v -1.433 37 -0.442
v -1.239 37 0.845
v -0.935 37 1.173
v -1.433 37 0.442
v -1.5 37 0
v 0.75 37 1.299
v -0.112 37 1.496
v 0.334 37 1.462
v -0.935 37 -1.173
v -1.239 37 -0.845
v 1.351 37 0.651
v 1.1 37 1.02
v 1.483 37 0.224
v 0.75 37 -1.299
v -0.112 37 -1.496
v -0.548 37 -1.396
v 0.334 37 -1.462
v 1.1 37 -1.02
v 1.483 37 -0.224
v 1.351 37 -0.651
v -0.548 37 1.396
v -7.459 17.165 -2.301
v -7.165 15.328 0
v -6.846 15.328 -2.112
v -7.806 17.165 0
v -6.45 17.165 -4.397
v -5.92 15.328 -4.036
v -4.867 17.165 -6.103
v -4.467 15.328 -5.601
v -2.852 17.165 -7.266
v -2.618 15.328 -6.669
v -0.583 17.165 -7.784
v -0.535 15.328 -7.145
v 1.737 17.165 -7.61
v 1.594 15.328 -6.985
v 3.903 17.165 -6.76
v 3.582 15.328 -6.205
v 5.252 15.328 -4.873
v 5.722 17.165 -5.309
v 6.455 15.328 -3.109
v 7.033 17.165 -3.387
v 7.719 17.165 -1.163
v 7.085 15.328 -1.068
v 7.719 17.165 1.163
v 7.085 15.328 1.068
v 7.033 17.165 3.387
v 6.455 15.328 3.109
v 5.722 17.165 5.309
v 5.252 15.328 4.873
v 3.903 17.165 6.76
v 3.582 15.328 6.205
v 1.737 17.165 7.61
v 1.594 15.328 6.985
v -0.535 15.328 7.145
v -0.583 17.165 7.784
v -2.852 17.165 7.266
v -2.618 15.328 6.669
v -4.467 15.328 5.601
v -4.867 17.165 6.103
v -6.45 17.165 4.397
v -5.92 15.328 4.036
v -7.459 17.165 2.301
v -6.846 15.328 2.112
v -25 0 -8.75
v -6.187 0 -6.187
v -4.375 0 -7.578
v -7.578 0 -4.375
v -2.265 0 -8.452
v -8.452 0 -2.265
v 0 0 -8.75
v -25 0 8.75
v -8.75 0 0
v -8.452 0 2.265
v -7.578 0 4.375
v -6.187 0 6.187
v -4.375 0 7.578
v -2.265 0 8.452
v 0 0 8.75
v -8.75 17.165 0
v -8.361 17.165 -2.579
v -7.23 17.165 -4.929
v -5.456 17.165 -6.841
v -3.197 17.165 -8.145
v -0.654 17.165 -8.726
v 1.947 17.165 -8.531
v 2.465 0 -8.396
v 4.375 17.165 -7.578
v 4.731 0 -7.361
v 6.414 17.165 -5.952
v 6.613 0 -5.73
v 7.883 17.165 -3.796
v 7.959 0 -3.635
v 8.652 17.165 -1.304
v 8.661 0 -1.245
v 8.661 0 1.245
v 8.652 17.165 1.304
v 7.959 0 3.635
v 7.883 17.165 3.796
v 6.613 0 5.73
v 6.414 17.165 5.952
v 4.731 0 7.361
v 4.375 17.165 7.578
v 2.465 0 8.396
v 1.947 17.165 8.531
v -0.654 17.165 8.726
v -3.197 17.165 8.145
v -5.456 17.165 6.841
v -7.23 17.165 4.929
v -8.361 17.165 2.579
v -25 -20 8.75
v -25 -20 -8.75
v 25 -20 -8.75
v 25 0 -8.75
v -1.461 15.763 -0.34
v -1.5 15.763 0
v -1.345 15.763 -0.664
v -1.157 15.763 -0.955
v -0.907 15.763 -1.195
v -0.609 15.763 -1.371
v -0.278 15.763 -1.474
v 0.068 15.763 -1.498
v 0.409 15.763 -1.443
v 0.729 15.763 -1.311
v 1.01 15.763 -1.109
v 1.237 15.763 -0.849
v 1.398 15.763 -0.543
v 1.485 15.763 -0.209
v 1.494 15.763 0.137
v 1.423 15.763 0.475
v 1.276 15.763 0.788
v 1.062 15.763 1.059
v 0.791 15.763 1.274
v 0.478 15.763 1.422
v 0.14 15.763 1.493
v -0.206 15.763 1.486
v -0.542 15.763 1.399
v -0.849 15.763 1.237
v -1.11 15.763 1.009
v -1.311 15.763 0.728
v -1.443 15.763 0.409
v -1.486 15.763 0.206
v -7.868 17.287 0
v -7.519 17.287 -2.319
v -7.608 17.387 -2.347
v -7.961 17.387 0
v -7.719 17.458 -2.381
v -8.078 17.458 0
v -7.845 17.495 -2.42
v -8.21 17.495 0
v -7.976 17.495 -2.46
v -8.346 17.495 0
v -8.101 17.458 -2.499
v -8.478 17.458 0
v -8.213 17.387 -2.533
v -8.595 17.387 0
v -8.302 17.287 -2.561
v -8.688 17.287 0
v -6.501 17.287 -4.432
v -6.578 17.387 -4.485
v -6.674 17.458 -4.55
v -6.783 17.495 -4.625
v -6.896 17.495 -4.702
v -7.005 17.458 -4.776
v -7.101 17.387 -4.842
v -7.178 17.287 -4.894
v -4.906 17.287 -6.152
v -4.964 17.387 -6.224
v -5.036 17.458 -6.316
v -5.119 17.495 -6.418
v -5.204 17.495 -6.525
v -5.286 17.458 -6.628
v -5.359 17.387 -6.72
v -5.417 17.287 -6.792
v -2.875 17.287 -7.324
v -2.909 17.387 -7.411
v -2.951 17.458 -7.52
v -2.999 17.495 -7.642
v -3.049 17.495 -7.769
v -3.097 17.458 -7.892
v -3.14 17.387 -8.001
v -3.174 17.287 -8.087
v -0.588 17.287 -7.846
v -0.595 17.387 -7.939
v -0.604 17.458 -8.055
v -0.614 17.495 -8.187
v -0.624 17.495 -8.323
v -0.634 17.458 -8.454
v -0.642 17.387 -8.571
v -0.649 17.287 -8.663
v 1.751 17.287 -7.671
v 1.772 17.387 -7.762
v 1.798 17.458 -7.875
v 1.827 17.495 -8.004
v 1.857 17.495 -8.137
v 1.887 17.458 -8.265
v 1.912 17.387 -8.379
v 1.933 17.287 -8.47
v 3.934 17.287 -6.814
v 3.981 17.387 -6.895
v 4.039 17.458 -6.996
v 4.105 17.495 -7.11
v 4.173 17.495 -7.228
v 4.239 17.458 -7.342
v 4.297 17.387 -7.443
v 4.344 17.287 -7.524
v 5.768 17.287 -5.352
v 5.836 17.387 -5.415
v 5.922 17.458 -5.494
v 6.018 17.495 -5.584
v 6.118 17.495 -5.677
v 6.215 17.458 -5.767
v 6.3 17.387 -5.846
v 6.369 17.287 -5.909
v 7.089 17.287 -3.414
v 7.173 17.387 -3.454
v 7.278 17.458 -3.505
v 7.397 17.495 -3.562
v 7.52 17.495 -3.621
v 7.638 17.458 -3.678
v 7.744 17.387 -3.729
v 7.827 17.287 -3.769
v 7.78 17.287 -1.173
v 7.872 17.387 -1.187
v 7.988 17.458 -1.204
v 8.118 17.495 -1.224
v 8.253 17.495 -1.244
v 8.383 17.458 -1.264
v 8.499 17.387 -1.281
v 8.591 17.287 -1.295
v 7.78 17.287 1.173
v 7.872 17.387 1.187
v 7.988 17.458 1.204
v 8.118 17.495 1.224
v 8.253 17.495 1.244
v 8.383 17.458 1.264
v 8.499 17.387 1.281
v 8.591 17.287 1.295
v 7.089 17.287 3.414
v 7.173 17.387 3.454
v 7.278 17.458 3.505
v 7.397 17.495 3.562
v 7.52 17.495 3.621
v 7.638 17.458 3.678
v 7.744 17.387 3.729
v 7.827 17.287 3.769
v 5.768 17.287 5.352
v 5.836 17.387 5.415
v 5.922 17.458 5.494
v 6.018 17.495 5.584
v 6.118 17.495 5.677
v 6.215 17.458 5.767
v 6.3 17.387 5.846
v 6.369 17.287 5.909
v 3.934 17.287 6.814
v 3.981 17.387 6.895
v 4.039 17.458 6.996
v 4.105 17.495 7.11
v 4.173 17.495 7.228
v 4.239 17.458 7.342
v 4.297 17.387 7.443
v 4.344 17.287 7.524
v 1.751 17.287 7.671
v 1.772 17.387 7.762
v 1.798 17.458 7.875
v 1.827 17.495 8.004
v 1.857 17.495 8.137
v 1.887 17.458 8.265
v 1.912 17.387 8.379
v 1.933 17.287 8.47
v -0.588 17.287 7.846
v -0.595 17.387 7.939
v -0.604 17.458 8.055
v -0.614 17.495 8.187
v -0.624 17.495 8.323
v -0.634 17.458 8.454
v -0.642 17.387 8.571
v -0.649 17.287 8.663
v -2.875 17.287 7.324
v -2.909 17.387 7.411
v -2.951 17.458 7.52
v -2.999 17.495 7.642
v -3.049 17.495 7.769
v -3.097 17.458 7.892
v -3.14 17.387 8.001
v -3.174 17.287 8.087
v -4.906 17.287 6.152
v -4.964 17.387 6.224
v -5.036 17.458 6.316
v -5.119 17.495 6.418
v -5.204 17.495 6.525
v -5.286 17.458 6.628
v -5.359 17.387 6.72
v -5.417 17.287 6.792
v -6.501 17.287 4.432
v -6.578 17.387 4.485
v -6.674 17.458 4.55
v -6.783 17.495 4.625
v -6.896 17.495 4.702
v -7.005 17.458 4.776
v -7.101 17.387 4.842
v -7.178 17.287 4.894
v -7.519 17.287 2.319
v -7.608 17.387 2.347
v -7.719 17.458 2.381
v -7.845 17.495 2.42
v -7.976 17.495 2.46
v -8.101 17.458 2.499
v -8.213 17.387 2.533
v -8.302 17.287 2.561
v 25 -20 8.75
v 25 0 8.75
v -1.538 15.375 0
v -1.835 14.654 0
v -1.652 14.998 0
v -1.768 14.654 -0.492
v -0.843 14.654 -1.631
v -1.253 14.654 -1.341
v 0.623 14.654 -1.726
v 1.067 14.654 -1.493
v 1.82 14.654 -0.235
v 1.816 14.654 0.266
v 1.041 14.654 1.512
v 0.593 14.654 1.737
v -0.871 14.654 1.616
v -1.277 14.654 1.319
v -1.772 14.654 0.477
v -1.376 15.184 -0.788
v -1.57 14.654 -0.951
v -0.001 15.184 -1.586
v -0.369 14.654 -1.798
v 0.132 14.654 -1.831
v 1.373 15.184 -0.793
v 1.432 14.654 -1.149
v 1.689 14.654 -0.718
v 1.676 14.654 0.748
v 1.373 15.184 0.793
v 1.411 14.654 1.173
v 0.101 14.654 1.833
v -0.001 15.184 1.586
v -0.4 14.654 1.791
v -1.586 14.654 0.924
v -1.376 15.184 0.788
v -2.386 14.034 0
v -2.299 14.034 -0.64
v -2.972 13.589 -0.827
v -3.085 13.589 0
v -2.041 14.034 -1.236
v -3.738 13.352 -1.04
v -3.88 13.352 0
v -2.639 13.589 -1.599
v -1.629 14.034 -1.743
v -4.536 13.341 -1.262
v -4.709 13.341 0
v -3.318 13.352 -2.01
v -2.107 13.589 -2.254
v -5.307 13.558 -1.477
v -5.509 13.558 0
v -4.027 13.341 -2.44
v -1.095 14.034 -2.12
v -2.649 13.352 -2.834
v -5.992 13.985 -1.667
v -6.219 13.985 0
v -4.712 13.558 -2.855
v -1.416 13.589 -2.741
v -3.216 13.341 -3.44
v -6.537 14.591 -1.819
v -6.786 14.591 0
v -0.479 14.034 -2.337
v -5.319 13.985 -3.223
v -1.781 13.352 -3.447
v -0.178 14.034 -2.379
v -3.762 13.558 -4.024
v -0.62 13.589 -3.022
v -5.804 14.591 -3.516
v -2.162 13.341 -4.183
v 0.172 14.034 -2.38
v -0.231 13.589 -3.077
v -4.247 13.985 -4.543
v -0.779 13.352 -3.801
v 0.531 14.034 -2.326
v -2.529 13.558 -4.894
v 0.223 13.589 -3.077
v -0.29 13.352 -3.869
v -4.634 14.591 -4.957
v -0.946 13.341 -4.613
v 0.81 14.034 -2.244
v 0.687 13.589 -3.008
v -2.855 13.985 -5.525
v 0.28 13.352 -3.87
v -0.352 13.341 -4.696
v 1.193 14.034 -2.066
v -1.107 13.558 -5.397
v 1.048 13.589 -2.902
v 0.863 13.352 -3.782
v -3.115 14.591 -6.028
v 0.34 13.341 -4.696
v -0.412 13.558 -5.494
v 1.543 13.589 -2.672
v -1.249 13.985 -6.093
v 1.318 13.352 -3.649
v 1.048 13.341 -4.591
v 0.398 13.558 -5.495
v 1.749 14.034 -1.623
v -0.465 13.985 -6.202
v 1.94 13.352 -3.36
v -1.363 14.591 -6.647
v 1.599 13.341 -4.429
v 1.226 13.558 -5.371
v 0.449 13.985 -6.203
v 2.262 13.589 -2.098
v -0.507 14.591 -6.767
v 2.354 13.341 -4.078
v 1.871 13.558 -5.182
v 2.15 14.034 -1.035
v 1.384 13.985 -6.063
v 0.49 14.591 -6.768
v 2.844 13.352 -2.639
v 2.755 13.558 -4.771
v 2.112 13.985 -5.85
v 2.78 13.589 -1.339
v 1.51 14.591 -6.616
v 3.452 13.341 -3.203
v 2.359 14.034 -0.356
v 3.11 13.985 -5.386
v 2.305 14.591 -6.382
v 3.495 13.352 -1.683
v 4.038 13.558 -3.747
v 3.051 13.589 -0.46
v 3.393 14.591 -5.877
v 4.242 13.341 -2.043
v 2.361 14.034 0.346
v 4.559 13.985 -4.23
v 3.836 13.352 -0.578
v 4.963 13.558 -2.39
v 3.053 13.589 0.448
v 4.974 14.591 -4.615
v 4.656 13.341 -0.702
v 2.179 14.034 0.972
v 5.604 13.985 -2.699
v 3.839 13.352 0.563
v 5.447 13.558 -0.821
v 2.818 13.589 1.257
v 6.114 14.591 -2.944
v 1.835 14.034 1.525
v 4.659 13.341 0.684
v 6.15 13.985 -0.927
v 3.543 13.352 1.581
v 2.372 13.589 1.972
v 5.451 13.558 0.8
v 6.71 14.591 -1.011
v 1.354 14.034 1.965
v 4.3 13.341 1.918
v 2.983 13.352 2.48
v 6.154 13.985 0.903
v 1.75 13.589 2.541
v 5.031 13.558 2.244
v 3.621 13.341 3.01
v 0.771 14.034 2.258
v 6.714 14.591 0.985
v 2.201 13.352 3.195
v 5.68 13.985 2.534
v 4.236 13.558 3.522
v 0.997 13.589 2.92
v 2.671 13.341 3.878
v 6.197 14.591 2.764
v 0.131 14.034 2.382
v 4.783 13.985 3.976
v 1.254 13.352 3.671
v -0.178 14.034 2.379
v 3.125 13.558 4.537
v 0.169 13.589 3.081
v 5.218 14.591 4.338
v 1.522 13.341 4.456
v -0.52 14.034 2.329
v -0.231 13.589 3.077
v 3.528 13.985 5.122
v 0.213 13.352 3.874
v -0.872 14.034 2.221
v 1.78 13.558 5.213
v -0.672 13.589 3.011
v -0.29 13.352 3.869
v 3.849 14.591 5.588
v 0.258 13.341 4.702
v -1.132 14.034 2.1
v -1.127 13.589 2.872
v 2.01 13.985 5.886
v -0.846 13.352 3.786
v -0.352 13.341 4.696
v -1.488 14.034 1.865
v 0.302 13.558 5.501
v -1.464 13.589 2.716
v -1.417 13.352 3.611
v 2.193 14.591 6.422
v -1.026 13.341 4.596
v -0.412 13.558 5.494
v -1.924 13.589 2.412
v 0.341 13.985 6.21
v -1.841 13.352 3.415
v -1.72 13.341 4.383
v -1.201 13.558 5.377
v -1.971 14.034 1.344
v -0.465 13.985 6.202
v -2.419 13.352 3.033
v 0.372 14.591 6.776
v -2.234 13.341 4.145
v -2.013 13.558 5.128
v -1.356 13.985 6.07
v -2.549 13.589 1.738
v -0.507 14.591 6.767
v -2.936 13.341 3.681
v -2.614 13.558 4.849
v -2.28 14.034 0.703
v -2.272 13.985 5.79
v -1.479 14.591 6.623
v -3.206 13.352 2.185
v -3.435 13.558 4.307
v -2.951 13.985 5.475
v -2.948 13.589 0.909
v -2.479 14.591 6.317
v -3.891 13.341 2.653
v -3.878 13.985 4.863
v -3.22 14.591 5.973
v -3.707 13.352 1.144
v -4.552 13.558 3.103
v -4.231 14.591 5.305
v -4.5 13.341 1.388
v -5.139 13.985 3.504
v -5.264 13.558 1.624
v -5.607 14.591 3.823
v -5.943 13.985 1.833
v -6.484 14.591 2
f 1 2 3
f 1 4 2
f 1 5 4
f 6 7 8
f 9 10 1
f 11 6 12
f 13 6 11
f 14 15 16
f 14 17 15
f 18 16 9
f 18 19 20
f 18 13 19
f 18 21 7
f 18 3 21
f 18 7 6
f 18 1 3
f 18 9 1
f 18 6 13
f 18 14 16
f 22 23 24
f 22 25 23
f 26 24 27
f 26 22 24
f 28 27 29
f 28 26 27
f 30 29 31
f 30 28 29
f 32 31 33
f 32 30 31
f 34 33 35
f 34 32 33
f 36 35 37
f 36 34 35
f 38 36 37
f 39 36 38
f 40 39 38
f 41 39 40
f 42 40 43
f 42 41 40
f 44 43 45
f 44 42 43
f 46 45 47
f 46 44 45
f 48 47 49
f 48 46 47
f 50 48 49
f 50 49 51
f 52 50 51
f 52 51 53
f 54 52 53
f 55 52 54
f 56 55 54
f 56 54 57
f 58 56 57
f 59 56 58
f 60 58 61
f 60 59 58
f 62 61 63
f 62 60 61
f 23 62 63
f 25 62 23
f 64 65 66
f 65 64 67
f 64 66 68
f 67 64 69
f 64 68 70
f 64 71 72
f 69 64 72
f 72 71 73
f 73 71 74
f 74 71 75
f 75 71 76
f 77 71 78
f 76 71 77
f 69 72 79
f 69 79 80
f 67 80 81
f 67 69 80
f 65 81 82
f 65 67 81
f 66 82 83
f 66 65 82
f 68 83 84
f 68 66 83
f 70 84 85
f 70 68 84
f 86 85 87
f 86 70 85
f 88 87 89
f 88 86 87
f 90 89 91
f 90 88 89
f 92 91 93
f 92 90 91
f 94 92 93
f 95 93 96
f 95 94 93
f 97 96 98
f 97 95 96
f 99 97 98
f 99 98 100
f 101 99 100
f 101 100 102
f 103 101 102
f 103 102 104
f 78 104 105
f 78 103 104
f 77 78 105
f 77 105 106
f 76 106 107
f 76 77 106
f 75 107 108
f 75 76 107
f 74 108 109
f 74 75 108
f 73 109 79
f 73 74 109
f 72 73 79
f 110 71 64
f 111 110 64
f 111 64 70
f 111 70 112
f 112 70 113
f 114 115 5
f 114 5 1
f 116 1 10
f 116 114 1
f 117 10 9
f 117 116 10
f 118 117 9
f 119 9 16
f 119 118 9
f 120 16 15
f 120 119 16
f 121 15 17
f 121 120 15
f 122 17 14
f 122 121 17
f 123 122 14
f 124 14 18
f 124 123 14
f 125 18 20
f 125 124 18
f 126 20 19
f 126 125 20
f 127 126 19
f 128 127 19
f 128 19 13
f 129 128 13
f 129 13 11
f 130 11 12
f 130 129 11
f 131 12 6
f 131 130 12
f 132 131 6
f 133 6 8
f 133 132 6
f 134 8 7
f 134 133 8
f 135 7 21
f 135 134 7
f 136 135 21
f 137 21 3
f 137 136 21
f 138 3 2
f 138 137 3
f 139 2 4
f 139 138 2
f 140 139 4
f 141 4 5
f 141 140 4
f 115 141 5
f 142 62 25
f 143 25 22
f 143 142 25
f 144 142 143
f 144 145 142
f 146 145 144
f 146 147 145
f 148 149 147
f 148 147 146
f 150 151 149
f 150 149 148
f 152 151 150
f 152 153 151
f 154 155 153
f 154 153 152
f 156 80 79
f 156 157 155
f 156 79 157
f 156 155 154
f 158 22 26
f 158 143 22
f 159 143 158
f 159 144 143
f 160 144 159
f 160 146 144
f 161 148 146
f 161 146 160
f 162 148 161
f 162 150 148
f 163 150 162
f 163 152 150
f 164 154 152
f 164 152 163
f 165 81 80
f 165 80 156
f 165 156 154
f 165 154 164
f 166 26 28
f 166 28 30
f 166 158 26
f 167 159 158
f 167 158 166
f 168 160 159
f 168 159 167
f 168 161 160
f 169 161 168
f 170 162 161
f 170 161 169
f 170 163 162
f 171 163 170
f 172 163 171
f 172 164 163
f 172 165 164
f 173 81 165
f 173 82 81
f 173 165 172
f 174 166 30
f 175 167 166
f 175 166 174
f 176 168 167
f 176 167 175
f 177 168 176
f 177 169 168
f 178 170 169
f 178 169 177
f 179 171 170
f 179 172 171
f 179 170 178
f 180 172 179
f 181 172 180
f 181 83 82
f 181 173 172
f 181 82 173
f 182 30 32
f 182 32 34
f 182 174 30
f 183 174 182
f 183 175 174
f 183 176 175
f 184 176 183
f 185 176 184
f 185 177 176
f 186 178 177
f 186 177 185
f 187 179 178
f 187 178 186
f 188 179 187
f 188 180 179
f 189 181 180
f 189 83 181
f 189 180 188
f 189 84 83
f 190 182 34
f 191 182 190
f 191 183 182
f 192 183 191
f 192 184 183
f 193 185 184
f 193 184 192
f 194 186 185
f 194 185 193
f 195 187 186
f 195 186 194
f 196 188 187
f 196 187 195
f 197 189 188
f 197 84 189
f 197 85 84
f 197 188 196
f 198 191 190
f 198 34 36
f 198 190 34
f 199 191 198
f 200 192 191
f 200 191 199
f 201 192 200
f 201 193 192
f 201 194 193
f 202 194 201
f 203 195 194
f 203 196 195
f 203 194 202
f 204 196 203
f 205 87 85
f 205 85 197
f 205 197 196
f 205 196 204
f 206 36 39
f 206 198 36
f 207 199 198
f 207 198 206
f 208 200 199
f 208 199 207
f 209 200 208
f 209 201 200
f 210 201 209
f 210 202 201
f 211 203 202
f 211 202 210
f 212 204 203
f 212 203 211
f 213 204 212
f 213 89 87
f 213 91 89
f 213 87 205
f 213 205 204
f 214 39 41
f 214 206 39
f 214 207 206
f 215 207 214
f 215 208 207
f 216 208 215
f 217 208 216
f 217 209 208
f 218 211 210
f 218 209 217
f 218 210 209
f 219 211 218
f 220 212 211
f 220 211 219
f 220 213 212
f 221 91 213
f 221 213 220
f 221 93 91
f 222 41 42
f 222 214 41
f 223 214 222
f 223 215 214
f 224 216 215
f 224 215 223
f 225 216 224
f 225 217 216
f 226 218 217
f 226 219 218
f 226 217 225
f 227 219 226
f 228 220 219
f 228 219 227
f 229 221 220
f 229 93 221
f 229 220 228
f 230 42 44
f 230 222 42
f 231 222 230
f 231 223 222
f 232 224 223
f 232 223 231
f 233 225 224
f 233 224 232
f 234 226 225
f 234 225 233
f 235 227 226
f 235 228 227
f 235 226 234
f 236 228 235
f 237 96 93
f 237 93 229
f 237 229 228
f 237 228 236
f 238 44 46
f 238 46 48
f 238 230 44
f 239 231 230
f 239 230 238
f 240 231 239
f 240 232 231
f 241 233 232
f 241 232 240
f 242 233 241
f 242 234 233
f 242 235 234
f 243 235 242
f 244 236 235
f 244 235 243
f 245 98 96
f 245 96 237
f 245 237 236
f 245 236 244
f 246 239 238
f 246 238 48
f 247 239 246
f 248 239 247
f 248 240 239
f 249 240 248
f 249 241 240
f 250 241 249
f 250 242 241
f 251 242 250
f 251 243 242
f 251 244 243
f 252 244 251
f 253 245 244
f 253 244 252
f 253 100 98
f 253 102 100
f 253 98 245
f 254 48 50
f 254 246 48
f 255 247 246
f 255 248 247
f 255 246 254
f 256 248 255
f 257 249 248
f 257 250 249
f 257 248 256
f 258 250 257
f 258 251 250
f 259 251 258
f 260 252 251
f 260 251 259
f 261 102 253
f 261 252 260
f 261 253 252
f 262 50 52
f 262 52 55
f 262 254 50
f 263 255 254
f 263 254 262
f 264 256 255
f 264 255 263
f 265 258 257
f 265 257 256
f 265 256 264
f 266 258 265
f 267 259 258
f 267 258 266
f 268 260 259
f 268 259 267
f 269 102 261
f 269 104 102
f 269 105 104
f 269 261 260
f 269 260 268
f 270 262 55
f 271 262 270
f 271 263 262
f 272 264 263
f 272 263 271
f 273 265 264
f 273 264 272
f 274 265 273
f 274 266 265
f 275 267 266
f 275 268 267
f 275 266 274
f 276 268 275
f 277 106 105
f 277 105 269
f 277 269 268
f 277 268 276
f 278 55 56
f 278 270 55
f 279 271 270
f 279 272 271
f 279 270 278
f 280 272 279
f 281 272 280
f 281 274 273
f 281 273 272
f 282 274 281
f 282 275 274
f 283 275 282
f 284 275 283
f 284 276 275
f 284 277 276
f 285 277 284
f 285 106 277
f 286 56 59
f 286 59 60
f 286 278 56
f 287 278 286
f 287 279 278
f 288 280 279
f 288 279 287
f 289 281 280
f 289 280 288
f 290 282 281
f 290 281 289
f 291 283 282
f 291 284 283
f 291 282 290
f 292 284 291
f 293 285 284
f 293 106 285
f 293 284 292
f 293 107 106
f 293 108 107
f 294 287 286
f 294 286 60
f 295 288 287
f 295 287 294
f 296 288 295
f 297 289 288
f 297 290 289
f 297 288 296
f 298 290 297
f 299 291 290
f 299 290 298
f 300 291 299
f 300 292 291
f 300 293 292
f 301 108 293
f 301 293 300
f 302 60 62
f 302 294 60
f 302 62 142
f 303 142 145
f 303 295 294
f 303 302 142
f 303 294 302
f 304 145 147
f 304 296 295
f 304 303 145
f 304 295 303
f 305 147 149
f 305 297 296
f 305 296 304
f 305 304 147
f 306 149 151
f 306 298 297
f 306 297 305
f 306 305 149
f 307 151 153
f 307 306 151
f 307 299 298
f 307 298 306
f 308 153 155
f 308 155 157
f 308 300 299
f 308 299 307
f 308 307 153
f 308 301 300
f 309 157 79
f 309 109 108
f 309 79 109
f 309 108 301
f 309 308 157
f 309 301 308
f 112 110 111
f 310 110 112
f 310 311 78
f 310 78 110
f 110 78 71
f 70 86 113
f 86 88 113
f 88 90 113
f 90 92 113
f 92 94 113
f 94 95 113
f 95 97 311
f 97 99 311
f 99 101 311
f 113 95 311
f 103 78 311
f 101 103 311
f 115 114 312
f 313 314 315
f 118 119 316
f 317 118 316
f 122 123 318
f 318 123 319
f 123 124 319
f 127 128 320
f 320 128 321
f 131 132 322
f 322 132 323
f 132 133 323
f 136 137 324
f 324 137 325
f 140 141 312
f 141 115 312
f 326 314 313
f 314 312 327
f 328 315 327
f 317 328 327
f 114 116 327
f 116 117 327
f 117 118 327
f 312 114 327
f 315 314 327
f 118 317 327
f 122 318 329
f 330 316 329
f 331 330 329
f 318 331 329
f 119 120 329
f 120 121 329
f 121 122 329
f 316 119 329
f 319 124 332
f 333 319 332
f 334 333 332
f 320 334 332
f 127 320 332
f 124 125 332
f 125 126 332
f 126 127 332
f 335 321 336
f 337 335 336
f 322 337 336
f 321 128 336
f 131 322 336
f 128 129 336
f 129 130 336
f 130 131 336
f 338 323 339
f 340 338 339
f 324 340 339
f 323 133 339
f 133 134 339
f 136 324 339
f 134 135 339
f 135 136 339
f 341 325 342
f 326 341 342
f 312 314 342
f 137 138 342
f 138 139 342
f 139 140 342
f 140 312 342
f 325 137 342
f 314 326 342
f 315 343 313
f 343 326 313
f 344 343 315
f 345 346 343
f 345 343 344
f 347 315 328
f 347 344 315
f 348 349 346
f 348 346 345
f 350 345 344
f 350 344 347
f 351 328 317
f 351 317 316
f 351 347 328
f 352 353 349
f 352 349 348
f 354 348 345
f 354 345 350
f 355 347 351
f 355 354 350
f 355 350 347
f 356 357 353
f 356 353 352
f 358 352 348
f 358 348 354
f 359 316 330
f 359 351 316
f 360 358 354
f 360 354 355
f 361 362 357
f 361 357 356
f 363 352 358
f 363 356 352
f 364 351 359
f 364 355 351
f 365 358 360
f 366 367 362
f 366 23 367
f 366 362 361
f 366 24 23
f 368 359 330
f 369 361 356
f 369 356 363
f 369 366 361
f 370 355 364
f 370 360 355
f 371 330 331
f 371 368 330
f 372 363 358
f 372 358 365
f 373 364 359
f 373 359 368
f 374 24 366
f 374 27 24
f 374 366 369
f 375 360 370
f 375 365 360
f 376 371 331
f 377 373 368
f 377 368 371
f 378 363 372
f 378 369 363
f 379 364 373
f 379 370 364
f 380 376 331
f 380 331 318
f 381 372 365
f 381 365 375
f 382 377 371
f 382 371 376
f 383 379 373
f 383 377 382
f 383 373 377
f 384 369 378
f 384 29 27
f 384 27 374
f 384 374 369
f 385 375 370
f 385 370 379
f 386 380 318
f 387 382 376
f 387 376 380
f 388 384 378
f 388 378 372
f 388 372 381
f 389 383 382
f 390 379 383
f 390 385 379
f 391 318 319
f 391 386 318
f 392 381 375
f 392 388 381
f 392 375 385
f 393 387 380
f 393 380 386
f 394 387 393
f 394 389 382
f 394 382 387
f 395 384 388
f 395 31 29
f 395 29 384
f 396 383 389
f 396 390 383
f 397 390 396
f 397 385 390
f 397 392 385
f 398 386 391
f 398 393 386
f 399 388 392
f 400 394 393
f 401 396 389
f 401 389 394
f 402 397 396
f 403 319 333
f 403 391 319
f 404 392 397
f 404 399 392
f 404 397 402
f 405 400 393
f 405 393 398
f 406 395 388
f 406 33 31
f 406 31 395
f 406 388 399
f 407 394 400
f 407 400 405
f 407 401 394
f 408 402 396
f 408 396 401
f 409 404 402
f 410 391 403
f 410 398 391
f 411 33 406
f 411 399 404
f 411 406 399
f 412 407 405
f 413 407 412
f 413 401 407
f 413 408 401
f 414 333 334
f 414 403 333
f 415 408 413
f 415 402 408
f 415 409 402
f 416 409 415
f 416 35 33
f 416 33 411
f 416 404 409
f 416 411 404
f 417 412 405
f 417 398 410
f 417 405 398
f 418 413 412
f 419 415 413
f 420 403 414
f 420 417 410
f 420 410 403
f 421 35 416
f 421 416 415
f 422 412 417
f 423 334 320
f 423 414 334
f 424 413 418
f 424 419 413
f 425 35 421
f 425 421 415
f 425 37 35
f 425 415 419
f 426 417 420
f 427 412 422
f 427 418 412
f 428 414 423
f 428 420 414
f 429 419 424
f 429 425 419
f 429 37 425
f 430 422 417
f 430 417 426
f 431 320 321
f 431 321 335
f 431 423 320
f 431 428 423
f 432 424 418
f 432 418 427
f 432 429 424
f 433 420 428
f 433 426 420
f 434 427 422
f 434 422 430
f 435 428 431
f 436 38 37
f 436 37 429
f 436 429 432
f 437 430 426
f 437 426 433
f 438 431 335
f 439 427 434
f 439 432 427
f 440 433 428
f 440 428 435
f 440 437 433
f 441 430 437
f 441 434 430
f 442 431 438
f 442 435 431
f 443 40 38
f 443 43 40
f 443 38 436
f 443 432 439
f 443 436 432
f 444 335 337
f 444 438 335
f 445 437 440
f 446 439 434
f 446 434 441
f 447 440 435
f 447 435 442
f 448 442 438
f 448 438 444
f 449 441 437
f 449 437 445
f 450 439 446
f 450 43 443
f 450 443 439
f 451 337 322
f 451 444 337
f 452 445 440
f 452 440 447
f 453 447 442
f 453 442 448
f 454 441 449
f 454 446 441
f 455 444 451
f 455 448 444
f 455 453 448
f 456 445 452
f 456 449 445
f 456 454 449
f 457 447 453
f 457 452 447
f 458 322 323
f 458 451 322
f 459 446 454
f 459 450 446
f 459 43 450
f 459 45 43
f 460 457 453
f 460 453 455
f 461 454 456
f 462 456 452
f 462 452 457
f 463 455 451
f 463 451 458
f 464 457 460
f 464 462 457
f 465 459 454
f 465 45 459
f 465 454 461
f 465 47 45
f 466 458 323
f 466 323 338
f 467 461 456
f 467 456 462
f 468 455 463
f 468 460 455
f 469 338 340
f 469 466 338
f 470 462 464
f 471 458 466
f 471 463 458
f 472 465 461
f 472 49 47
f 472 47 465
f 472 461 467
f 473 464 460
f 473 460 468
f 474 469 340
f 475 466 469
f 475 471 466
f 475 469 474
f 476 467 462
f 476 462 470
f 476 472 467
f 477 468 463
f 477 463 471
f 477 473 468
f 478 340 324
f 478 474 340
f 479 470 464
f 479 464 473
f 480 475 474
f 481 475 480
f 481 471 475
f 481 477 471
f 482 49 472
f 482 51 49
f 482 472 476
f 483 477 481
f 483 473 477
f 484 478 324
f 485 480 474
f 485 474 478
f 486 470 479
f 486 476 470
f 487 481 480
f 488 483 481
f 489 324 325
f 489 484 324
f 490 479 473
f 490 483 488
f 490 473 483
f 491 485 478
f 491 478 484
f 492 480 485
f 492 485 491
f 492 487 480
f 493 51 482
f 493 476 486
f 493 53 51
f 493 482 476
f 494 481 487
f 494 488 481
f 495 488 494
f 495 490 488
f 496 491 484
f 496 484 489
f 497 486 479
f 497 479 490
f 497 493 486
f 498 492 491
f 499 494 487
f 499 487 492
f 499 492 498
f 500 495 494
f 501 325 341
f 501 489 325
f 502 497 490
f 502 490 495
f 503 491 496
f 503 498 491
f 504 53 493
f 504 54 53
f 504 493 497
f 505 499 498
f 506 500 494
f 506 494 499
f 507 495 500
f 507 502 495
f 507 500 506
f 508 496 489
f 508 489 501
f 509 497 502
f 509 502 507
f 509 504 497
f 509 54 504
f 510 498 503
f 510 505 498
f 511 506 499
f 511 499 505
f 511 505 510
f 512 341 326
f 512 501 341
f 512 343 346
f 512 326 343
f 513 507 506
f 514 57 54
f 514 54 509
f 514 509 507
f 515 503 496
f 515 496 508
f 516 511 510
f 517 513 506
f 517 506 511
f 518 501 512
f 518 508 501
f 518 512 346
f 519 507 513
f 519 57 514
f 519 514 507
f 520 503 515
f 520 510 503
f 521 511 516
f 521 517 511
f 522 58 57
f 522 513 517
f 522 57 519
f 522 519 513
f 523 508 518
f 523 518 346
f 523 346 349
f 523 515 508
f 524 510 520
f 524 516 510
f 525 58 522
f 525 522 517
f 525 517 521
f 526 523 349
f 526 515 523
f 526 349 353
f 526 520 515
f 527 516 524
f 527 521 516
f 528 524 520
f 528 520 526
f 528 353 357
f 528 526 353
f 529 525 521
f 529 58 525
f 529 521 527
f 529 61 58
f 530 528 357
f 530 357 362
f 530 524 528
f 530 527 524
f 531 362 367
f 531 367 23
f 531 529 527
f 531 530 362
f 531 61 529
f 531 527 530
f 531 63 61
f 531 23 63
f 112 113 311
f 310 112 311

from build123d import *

# Parameters (mm, degrees)
F2_R     = 2
F4_DEPTH = 20


with BuildPart() as f1:
    # F0 (on Top) → F1 (revolve)
    with BuildSketch(Plane.XY):
        with BuildLine():
            Line((-8.75, 0), (0, 0))
            Line((0, 0), (0, 37))
            Line((0, 37), (-1.5, 37))
            Line((-1.5, 37), (-1.5, 15.3282299509))
            ThreePointArc((-1.5, 15.3282299509), (-4.3322917664, 13.3172311391), (-7.1645835327, 15.3282299509))
            Line((-7.1645835327, 15.3282299509), (-7.8059027445, 17.1648335314))
            ThreePointArc((-7.8059027445, 17.1648335314), (-8.2779513723, 17.5), (-8.75, 17.1648335314))
            Line((-8.75, 17.1648335314), (-8.75, 0))
        make_face()
    revolve(axis=Axis((0, 18.5, 0), (0, -1, 0)))

    # F2
    f2_edges = [f1.edges().sort_by_distance(p)[0] for p in [
        (1.5, 15.32823, 0),
    ]]
    fillet(f2_edges, radius=F2_R)

    # F3 (on face) → F4 (join)
    with BuildSketch(Plane.XZ):
        with BuildLine():
            Line((9.5e-09, 8.75), (-25, 8.75))
            Line((-25, 8.75), (-25, -8.75))
            Line((-25, -8.75), (0, -8.75))
            ThreePointArc((0, -8.75), (-8.75, 4.8e-09), (9.5e-09, 8.75))
        make_face()
        with BuildLine():
            Line((25, 8.75), (9.5e-09, 8.75))
            ThreePointArc((9.5e-09, 8.75), (6.1871843388, 6.187184332), (8.75, 0))
            ThreePointArc((8.75, 0), (6.1871843354, -6.1871843354), (0, -8.75))
            Line((0, -8.75), (25, -8.75))
            Line((25, -8.75), (25, 8.75))
        make_face()
        with BuildLine():
            ThreePointArc((8.75, 0), (6.1871843388, 6.187184332), (9.5e-09, 8.75))
            ThreePointArc((9.5e-09, 8.75), (-8.75, 4.8e-09), (0, -8.75))
            ThreePointArc((0, -8.75), (6.1871843354, -6.1871843354), (8.75, 0))
        make_face()
    extrude(amount=F4_DEPTH)


solid = f1.part
